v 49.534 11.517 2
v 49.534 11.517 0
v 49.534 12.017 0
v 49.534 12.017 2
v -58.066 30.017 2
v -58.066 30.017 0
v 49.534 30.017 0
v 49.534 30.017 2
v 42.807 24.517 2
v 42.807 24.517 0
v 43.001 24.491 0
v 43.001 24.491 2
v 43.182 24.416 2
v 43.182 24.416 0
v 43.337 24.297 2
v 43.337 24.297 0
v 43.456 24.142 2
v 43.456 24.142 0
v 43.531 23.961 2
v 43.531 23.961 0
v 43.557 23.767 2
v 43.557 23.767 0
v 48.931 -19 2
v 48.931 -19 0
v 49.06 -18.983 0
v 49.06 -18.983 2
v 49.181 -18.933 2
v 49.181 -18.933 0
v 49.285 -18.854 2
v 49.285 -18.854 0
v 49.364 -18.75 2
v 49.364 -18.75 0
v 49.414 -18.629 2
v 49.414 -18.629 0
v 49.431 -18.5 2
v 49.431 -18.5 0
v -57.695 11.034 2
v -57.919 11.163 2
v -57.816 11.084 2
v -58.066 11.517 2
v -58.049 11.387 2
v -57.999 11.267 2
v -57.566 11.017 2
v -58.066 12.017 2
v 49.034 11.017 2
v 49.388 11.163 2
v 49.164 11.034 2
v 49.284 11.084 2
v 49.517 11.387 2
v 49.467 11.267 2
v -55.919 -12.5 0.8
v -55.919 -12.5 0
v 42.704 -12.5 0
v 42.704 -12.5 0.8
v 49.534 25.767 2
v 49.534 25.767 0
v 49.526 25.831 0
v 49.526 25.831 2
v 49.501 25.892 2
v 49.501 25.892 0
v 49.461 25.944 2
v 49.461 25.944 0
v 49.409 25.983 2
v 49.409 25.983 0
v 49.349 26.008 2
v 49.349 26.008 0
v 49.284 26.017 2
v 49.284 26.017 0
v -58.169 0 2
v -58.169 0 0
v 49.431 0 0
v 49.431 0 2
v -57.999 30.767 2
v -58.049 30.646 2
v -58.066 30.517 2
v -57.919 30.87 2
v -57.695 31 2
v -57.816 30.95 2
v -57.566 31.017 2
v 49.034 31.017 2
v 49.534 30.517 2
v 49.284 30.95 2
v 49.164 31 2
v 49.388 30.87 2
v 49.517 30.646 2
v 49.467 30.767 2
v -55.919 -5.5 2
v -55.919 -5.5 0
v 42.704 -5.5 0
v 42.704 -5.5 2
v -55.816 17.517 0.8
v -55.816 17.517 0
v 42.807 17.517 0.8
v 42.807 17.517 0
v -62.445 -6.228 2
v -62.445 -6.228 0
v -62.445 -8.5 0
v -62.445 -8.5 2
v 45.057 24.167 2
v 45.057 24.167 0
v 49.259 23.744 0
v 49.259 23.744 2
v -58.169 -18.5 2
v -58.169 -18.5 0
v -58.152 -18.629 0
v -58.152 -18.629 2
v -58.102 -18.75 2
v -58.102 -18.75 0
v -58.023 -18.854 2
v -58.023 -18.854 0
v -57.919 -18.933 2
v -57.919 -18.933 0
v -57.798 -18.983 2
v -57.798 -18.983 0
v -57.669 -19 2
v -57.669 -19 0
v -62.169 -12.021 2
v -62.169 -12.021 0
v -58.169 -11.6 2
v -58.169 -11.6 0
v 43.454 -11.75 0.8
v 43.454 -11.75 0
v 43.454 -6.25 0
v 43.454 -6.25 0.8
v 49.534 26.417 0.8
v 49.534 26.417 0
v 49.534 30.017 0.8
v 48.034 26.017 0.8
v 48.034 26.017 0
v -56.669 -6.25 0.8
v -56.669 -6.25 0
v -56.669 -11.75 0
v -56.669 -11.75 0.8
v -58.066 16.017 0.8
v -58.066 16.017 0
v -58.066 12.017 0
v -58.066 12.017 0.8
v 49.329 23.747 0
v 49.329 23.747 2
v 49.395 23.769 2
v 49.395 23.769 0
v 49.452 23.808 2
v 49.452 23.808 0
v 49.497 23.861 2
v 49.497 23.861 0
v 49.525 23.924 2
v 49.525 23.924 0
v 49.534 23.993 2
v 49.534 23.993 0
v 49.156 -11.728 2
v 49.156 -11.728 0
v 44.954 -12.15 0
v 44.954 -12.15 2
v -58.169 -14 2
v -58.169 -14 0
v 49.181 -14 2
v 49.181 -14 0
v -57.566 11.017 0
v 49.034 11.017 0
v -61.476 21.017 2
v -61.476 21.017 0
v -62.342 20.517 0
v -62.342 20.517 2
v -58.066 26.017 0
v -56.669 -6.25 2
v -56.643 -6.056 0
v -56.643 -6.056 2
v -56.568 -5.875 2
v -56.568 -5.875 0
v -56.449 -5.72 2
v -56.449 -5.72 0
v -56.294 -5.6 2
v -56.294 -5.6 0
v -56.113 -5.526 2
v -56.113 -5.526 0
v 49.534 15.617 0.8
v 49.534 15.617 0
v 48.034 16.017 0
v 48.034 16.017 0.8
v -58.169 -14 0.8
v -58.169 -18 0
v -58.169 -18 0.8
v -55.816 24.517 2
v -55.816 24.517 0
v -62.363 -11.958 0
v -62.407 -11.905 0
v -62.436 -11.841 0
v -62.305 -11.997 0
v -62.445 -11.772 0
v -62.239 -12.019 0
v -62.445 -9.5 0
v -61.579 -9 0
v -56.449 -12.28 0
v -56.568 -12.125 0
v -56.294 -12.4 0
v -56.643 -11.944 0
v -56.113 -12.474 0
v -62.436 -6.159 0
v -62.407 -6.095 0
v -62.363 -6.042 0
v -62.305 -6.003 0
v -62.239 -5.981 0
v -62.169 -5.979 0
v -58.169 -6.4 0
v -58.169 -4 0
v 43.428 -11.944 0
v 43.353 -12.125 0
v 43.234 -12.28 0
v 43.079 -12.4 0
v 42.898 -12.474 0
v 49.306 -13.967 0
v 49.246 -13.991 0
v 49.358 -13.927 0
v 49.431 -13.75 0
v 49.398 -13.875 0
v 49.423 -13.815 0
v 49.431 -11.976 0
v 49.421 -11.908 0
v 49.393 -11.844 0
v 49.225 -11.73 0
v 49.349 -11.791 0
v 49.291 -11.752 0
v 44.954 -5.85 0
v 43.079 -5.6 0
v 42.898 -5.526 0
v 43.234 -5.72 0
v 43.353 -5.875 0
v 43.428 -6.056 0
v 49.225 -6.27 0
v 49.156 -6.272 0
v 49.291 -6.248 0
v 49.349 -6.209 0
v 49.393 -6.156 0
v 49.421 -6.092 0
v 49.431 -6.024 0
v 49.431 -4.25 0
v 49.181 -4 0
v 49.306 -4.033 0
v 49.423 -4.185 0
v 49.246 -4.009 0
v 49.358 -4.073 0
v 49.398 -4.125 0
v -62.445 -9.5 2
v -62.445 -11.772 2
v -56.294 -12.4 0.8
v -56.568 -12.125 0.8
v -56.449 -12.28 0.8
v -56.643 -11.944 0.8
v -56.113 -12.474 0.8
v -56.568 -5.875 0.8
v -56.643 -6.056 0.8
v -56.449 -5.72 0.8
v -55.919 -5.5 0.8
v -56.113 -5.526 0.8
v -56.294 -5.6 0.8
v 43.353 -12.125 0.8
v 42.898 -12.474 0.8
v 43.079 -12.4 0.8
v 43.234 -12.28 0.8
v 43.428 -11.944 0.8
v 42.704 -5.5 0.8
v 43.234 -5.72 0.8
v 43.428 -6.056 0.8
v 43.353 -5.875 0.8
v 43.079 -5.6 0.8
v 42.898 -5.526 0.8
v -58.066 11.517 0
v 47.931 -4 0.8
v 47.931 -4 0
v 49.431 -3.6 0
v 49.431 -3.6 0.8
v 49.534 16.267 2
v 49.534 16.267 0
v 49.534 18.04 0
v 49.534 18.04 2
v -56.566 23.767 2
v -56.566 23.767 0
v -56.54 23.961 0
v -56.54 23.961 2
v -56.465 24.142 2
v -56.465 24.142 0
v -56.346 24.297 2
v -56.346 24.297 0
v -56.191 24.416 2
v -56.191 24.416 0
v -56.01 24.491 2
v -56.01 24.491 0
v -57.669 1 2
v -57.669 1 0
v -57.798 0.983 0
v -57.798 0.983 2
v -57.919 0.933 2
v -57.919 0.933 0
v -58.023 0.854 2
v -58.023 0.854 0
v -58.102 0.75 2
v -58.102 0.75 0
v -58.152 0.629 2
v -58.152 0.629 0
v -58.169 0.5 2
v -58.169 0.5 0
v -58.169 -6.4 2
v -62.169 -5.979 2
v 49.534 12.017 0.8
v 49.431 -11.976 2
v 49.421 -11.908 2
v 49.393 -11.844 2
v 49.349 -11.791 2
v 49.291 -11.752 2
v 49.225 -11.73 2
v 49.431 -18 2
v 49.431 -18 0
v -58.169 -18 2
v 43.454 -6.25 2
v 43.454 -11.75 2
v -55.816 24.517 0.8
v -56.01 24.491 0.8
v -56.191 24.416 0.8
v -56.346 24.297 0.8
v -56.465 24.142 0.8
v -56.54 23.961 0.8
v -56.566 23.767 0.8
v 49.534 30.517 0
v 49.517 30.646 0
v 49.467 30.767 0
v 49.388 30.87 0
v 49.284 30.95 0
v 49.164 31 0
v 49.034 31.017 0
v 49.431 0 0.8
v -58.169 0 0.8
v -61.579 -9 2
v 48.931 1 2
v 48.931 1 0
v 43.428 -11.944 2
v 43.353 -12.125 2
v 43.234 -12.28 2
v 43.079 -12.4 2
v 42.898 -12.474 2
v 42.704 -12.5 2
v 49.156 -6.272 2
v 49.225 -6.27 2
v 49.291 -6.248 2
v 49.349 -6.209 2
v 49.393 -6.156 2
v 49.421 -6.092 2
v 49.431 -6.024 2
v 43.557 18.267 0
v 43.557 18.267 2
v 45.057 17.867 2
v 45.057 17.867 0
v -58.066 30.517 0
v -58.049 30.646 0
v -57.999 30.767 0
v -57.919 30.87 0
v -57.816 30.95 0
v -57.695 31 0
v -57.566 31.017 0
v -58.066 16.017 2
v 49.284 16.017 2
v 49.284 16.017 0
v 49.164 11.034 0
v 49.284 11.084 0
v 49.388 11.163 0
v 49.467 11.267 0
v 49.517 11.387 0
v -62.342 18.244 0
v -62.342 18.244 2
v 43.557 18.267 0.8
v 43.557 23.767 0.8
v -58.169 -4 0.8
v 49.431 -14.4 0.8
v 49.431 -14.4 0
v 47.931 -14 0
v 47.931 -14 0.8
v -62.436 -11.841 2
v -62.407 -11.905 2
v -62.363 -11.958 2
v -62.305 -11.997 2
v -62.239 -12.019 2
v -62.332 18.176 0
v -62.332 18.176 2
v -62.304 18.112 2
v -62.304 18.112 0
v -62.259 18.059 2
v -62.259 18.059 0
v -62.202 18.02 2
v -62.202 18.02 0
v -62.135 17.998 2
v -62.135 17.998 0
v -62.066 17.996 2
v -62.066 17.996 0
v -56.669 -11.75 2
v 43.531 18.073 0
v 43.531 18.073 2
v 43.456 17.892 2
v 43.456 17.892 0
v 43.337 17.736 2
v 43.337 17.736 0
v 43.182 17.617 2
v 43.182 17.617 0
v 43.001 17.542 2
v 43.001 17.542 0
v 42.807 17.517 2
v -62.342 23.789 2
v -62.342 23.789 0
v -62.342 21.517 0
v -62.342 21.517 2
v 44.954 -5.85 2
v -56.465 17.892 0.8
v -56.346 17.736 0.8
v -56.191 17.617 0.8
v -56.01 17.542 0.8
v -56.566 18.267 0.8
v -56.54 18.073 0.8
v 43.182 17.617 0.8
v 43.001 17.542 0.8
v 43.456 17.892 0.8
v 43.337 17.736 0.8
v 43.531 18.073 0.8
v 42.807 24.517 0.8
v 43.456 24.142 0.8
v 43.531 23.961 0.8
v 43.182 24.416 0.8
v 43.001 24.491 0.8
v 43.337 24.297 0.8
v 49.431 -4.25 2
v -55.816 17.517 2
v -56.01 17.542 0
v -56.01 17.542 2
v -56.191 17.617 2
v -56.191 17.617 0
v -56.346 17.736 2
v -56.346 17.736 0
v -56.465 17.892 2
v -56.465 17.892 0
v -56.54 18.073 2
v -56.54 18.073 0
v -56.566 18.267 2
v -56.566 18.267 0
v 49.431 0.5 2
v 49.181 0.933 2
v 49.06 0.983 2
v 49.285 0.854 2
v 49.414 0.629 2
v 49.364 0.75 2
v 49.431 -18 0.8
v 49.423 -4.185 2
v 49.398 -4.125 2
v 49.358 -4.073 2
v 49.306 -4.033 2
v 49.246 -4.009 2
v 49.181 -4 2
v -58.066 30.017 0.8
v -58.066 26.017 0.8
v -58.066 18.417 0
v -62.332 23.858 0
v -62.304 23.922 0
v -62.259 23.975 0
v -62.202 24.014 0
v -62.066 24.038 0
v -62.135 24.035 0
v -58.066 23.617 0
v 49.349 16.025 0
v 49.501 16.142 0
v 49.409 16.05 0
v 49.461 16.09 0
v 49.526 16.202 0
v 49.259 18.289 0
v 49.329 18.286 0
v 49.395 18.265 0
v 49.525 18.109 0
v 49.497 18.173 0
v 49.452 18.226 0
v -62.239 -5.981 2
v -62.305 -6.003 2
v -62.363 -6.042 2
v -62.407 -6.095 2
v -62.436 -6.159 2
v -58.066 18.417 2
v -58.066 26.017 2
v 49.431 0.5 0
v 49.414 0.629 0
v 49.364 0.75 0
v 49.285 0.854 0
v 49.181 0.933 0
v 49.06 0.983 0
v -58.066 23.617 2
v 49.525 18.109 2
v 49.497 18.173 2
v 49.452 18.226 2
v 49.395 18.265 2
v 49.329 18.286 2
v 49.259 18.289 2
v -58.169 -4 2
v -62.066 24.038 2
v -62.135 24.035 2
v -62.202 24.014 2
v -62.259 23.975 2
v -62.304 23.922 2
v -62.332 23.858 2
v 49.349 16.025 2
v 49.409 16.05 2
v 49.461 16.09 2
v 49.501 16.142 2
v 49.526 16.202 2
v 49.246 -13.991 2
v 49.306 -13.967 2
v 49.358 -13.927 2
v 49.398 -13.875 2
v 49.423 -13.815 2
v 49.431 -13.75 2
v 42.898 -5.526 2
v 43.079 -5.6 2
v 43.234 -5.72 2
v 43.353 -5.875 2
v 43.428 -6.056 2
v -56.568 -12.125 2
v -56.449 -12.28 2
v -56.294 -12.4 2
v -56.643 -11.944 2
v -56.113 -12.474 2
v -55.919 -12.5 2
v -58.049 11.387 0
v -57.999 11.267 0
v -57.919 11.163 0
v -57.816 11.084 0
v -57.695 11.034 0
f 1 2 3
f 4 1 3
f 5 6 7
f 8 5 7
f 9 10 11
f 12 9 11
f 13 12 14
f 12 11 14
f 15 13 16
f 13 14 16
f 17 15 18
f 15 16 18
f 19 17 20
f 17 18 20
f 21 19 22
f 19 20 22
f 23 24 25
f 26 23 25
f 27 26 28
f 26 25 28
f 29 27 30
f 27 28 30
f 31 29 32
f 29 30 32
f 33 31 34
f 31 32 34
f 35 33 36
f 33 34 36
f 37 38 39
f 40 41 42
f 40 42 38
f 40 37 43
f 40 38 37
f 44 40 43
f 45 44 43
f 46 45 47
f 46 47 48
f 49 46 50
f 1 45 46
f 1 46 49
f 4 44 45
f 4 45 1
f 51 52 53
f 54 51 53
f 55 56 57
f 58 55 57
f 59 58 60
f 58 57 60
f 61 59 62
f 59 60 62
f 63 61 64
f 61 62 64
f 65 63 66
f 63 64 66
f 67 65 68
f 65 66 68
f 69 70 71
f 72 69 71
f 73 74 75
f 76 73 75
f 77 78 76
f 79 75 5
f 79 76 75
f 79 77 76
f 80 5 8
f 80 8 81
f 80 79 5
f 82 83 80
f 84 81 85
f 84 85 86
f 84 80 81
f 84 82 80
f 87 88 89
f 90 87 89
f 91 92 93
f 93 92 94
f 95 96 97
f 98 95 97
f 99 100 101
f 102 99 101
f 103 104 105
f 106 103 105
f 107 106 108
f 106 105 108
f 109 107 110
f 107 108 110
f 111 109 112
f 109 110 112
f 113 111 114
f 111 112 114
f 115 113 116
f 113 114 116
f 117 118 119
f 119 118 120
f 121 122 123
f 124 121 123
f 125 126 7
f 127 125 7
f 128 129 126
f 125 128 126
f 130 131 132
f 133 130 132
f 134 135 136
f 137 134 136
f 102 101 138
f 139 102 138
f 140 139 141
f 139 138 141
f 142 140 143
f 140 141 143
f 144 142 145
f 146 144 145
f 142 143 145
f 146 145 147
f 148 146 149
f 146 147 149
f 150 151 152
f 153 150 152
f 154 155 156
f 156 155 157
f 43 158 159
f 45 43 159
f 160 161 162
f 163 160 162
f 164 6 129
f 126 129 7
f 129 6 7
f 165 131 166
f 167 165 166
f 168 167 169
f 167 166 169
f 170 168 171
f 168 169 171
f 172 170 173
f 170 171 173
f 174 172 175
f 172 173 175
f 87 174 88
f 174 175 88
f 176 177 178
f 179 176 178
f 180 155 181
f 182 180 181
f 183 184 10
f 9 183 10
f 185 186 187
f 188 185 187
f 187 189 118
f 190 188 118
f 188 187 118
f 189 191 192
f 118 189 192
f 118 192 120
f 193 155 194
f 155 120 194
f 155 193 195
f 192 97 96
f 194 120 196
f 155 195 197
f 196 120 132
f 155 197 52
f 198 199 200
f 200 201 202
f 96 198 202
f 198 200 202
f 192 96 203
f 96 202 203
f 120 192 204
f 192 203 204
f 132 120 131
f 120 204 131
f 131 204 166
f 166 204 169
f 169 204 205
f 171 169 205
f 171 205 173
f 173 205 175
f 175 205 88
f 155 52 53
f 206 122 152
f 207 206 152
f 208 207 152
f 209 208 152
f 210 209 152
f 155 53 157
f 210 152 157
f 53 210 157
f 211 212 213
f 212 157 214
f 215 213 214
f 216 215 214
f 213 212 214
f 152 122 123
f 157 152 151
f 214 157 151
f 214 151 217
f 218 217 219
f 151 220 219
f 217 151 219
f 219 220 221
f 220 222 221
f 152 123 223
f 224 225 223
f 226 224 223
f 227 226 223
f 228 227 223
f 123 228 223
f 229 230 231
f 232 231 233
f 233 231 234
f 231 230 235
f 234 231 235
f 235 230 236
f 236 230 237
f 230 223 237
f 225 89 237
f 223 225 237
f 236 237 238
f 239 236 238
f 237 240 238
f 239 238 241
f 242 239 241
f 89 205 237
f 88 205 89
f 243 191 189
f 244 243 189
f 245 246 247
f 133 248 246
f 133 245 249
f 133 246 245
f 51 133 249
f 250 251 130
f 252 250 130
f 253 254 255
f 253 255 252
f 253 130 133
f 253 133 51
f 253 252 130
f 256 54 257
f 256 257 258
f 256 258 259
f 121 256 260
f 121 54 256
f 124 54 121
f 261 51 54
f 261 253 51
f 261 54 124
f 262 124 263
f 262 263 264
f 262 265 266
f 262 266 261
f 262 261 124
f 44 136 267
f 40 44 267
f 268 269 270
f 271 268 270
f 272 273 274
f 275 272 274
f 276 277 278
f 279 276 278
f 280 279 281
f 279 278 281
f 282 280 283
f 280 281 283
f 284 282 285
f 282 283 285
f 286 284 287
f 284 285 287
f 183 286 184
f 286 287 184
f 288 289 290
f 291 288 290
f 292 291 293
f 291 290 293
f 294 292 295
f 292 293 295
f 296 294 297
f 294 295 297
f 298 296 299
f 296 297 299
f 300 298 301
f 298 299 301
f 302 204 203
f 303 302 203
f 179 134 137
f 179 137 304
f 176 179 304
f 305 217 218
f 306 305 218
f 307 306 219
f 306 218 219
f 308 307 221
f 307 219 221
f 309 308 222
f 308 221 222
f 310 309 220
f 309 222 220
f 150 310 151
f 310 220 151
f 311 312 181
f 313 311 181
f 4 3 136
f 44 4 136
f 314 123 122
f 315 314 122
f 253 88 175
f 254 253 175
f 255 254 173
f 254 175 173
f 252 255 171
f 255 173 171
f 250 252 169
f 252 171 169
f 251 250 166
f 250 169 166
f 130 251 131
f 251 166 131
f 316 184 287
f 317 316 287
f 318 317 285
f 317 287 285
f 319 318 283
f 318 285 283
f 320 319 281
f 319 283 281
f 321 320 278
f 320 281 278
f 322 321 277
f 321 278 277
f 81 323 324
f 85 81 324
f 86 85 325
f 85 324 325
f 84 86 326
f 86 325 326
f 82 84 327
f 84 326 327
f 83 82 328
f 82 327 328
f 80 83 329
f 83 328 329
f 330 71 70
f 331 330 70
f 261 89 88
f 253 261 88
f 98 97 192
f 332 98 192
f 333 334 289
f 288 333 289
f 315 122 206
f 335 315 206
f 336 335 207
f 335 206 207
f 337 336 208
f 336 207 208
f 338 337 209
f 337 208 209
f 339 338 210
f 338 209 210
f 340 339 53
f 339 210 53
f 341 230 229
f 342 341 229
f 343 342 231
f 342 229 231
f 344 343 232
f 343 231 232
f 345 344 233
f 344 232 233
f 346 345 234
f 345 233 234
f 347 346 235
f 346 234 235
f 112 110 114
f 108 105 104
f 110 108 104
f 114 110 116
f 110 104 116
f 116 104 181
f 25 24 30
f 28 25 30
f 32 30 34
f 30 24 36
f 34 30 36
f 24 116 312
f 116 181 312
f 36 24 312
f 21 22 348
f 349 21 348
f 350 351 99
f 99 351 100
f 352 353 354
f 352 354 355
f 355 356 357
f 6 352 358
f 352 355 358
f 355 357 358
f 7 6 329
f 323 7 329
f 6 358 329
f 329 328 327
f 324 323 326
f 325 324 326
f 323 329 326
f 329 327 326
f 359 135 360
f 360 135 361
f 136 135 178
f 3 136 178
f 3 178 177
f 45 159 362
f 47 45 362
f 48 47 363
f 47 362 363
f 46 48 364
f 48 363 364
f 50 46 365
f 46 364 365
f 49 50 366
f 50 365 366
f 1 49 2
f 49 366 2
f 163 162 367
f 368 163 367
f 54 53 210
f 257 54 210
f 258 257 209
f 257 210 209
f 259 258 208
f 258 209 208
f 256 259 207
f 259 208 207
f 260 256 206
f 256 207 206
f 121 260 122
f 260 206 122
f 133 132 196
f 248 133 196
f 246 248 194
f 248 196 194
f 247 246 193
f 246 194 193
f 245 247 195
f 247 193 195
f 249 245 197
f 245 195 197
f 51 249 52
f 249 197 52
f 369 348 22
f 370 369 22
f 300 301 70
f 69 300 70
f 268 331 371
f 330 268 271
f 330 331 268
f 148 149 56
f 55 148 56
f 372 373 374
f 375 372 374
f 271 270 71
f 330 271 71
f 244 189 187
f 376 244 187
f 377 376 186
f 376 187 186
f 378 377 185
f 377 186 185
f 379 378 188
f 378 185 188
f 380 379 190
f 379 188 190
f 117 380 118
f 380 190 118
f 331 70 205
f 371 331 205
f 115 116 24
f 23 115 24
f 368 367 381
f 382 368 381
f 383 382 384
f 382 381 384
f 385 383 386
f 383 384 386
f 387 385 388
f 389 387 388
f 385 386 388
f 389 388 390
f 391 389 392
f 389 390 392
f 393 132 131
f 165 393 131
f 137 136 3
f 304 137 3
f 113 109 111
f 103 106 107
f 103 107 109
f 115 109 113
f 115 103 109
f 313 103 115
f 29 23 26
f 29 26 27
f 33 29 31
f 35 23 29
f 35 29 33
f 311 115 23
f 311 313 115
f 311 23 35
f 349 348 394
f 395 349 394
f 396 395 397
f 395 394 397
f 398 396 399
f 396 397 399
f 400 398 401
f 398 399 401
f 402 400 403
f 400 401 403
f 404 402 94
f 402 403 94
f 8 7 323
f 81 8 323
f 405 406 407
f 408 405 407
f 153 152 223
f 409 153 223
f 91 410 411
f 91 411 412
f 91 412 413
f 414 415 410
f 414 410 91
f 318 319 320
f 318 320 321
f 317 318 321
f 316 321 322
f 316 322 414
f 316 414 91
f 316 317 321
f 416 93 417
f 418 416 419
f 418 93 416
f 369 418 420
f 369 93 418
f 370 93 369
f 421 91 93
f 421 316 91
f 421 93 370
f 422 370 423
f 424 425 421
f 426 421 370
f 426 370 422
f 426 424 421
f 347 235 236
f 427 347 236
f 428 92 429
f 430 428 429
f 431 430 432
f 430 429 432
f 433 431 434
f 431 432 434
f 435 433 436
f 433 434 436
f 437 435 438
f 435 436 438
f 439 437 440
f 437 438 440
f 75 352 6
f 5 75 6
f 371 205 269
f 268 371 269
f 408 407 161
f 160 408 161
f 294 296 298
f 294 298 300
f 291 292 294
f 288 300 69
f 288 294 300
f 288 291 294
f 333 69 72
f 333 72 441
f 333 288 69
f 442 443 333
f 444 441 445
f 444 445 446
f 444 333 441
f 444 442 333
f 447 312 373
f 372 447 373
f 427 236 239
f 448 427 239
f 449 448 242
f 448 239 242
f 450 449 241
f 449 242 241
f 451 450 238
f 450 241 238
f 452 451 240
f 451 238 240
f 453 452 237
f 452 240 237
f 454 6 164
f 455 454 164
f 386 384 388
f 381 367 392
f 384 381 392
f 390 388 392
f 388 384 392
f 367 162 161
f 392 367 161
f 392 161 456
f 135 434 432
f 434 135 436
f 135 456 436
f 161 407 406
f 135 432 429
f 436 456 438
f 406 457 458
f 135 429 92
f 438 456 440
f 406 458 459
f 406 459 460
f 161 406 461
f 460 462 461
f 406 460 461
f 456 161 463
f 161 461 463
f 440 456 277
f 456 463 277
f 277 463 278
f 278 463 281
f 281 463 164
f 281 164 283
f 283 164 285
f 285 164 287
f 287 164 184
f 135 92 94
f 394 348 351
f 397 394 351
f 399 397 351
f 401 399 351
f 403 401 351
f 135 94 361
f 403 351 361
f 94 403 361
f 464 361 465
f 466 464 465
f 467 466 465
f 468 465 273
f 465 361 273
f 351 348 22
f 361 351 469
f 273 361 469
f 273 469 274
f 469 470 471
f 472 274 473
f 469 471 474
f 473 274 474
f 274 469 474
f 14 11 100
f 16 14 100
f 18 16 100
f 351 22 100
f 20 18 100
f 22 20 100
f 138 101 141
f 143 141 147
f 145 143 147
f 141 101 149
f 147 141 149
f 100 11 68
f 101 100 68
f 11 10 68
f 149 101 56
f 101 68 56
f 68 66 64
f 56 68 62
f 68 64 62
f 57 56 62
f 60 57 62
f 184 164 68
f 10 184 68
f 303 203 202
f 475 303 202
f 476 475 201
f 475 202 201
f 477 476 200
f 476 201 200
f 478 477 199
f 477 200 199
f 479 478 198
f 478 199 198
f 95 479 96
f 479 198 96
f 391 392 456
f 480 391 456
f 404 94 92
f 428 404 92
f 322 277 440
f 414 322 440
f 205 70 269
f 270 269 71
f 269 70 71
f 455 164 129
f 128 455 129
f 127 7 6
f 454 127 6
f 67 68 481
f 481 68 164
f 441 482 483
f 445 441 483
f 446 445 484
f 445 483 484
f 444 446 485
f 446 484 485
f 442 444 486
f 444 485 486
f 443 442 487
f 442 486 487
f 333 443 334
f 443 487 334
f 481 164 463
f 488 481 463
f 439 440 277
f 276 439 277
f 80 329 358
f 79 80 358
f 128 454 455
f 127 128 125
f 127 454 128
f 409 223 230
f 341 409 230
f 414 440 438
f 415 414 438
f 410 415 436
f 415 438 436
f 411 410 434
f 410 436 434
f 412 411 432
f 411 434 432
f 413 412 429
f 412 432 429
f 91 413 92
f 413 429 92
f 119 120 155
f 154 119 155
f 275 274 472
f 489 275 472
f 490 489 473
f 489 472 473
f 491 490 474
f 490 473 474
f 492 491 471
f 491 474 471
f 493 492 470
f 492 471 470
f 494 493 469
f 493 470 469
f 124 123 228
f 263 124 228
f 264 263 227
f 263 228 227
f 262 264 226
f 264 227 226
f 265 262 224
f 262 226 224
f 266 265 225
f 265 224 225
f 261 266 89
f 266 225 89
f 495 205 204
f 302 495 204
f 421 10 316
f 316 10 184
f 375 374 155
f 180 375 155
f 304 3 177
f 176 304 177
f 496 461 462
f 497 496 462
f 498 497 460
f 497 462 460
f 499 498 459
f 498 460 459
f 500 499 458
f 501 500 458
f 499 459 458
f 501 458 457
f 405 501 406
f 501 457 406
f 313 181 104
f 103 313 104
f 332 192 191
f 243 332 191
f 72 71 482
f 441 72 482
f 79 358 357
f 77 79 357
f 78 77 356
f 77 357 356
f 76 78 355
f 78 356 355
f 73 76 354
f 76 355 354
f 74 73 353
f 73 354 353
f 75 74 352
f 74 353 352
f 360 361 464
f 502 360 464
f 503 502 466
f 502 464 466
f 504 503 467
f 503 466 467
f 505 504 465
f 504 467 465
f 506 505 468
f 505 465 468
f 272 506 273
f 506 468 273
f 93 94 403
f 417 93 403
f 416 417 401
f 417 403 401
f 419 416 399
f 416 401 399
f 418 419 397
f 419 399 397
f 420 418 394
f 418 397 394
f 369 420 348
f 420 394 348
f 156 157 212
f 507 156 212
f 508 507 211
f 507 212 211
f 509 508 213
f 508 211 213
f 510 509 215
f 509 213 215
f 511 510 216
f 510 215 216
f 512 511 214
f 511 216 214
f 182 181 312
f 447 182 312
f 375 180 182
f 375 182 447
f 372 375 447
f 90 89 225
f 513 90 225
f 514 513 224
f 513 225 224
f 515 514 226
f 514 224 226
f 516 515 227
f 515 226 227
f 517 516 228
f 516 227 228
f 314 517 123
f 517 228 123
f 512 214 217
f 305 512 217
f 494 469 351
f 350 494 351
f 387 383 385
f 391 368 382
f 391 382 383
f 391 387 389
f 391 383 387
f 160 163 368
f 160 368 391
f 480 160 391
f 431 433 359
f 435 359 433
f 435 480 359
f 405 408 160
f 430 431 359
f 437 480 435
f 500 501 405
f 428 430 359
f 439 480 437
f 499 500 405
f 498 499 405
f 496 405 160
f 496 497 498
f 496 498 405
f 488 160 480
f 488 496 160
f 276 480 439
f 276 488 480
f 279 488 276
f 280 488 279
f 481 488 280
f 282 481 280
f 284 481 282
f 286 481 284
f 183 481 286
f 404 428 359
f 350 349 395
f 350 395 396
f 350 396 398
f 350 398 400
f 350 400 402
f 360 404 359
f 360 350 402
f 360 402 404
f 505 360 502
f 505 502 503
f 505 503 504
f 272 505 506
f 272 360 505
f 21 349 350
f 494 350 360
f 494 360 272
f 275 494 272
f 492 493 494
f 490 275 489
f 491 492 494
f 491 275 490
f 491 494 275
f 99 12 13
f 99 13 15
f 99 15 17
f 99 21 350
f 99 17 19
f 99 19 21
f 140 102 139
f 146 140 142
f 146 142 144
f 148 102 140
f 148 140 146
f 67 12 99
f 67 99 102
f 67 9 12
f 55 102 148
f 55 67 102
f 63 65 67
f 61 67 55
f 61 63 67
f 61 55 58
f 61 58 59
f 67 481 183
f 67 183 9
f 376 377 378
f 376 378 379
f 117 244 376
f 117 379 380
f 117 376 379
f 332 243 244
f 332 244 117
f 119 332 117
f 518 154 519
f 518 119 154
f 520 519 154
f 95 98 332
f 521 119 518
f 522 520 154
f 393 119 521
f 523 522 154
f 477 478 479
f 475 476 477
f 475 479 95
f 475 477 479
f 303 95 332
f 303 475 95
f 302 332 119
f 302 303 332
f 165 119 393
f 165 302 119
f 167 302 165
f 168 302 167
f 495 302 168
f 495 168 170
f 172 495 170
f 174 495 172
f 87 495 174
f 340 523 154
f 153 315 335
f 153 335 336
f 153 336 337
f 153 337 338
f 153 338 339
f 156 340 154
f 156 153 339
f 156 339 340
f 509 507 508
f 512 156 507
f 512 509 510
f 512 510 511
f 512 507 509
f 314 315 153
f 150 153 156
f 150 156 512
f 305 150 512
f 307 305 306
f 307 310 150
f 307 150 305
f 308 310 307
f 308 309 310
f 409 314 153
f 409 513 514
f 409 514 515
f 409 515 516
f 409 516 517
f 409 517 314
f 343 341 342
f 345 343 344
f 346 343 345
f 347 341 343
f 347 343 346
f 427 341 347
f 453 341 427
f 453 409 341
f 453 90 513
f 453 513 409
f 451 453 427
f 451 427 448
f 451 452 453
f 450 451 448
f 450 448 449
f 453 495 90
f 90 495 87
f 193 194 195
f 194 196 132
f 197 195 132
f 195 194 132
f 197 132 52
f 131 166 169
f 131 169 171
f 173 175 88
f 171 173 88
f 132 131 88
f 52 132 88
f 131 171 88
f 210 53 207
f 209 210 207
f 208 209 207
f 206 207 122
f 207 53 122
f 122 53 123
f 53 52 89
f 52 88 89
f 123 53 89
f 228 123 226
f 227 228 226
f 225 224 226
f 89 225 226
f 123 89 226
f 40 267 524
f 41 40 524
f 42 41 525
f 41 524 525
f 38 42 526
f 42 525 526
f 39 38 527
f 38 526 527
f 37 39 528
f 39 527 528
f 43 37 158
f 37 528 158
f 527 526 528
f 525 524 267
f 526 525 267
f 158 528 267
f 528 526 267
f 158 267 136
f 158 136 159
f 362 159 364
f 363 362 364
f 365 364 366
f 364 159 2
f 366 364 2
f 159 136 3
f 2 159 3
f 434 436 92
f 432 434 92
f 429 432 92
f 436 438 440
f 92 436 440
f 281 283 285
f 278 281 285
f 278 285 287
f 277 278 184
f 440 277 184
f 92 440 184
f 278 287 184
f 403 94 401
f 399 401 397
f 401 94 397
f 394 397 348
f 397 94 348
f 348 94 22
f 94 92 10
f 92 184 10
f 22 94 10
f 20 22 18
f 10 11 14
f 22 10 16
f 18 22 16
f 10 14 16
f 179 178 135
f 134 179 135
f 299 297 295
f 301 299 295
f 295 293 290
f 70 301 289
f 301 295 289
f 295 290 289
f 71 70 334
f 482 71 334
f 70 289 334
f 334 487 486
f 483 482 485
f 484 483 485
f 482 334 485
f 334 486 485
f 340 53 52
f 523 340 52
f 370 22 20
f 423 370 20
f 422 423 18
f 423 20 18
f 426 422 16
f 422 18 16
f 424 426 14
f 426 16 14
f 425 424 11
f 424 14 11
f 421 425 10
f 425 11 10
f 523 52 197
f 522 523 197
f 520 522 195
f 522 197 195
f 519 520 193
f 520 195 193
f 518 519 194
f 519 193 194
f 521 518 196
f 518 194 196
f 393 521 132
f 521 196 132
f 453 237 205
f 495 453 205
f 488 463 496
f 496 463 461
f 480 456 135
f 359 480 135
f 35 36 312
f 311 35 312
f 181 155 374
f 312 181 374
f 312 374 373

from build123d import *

# Parameters (mm, degrees)
F1_DEPTH = 2
F2_DEPTH = 0.8


with BuildPart() as f1:
    # F0 (on Top) → F1 (new body)
    with BuildSketch(Plane.XY):
        with BuildLine():
            Line((48.9310387218, 1), (-57.6689612782, 1))
            ThreePointArc((-57.6689612782, 1), (-58.0225146688, 0.8535533906), (-58.1689612782, 0.5))
            Line((-58.1689612782, 0.5), (-58.1689612782, 0))
            Line((-58.1689612782, 0), (49.4310387218, 0))
            Line((49.4310387218, 0), (49.4310387218, 0.5))
            ThreePointArc((49.4310387218, 0.5), (49.2845921124, 0.8535533906), (48.9310387218, 1))
        make_face()
    extrude(amount=F1_DEPTH)


with BuildPart() as f1b:
    # F0 (on Top) → F1, piece 2 (new body)
    with BuildSketch(Plane.XY):
        with BuildLine():
            Line((47.9310387218, -4), (-58.1689612782, -4))
            Line((-58.1689612782, -4), (-58.1689612782, -6.4))
            Line((-58.1689612782, -6.4), (-62.1691871508, -5.9790603277))
            ThreePointArc((-62.1691871508, -5.9790603277), (-62.362621132, -6.0418910502), (-62.4453499415, -6.2276875755))
            Line((-62.4453499415, -6.2276875755), (-62.4453499415, -8.5))
            Line((-62.4453499415, -8.5), (-61.5793245377, -9))
            Line((-61.5793245377, -9), (-62.4453499415, -9.5))
            Line((-62.4453499415, -9.5), (-62.4453499415, -11.7723124245))
            ThreePointArc((-62.4453499415, -11.7723124245), (-62.362621132, -11.9581089498), (-62.1691871508, -12.0209396723))
            Line((-62.1691871508, -12.0209396723), (-58.1689612782, -11.6))
            Line((-58.1689612782, -11.6), (-58.1689612782, -14))
            Line((-58.1689612782, -14), (47.9310387218, -14))
            Line((47.9310387218, -14), (49.1810387199, -14))
            ThreePointArc((49.1810387199, -14), (49.3578154159, -13.9267766946), (49.4310387199, -13.7499999981))
            Line((49.4310387199, -13.7499999981), (49.4310387064, -11.9763853971))
            ThreePointArc((49.4310387064, -11.9763853971), (49.348743804, -11.7909804362), (49.1560387064, -11.7276385397))
            Line((49.1560387064, -11.7276385397), (44.9535952373, -12.15))
            Line((44.9535952373, -12.15), (44.9535952225, -5.85))
            Line((44.9535952225, -5.85), (49.1560386934, -6.2723614605))
            ThreePointArc((49.1560386934, -6.2723614605), (49.3487437904, -6.2090195646), (49.4310386934, -6.0236146047))
            Line((49.4310386934, -6.0236146047), (49.4310387183, -4.2500000035))
            ThreePointArc((49.4310387183, -4.2500000035), (49.3578154149, -4.0732233059), (49.1810387183, -4))
            Line((49.1810387183, -4), (47.9310387218, -4))
        make_face()
        with BuildLine():
            ThreePointArc((-56.6689612782, -6.25), (-56.4492913641, -5.7196699141), (-55.9189612782, -5.5))
            Line((-55.9189612782, -5.5), (42.7035952381, -5.5))
            ThreePointArc((42.7035952381, -5.5), (43.233925324, -5.7196699141), (43.4535952381, -6.25))
            Line((43.4535952381, -6.25), (43.4535952381, -11.75))
            ThreePointArc((43.4535952381, -11.75), (43.233925324, -12.2803300859), (42.7035952381, -12.5))
            Line((42.7035952381, -12.5), (-55.9189612782, -12.5))
            ThreePointArc((-55.9189612782, -12.5), (-56.4492913641, -12.2803300859), (-56.6689612782, -11.75))
            Line((-56.6689612782, -11.75), (-56.6689612782, -6.25))
        make_face(mode=Mode.SUBTRACT)
    extrude(amount=F1_DEPTH)


with BuildPart() as f1c:
    # F0 (on Top) → F1, piece 3 (new body)
    with BuildSketch(Plane.XY):
        with BuildLine():
            Line((49.4310387218, -18), (-58.1689612782, -18))
            Line((-58.1689612782, -18), (-58.1689612782, -18.5))
            ThreePointArc((-58.1689612782, -18.5), (-58.0225146688, -18.8535533906), (-57.6689612782, -19))
            Line((-57.6689612782, -19), (48.9310387218, -19))
            ThreePointArc((48.9310387218, -19), (49.2845921124, -18.8535533906), (49.4310387218, -18.5))
            Line((49.4310387218, -18.5), (49.4310387218, -18))
        make_face()
    extrude(amount=F1_DEPTH)


with BuildPart() as f1d:
    # F0 (on Top) → F1, piece 4 (new body)
    with BuildSketch(Plane.XY):
        with BuildLine():
            Line((49.034391772, 31.0167935491), (-57.565608228, 31.0167935491))
            ThreePointArc((-57.565608228, 31.0167935491), (-57.9191616185, 30.8703469397), (-58.065608228, 30.5167935491))
            Line((-58.065608228, 30.5167935491), (-58.065608228, 30.0167935491))
            Line((-58.065608228, 30.0167935491), (49.534391772, 30.0167935491))
            Line((49.534391772, 30.0167935491), (49.534391772, 30.5167935491))
            ThreePointArc((49.534391772, 30.5167935491), (49.3879451626, 30.8703469397), (49.034391772, 31.0167935491))
        make_face()
    extrude(amount=F1_DEPTH)


with BuildPart() as f1e:
    # F0 (on Top) → F1, piece 5 (new body)
    with BuildSketch(Plane.XY):
        with BuildLine():
            Line((48.034391772, 26.0167935491), (-58.065608228, 26.0167935491))
            Line((-58.065608228, 26.0167935491), (-58.065608228, 23.6167935491))
            Line((-58.065608228, 23.6167935491), (-62.0658341006, 24.0377332214))
            ThreePointArc((-62.0658341006, 24.0377332214), (-62.2592680818, 23.9749024989), (-62.3419968913, 23.7891059735))
            Line((-62.3419968913, 23.7891059735), (-62.3419968913, 21.5167935491))
            Line((-62.3419968913, 21.5167935491), (-61.4759714875, 21.0167935491))
            Line((-61.4759714875, 21.0167935491), (-62.3419968913, 20.5167935491))
            Line((-62.3419968913, 20.5167935491), (-62.3419968913, 18.2444811246))
            ThreePointArc((-62.3419968913, 18.2444811246), (-62.2592680818, 18.0586845992), (-62.0658341006, 17.9958538767))
            Line((-62.0658341006, 17.9958538767), (-58.065608228, 18.4167935491))
            Line((-58.065608228, 18.4167935491), (-58.065608228, 16.0167935491))
            Line((-58.065608228, 16.0167935491), (48.034391772, 16.0167935491))
            Line((48.034391772, 16.0167935491), (49.2843917886, 16.0167935491))
            ThreePointArc((49.2843917886, 16.0167935491), (49.4611684781, 16.0900168479), (49.5343917886, 16.2667935325))
            Line((49.5343917886, 16.2667935325), (49.5343919064, 18.0404081314))
            ThreePointArc((49.5343919064, 18.0404081314), (49.4520970108, 18.2258131046), (49.2593919064, 18.2891550073))
            Line((49.2593919064, 18.2891550073), (45.0569484577, 17.8667935491))
            Line((45.0569484577, 17.8667935491), (45.0569483455, 24.1667935491))
            Line((45.0569483455, 24.1667935491), (49.2593918076, 23.7444320895))
            ThreePointArc((49.2593918076, 23.7444320895), (49.4520969076, 23.807773988), (49.5343918076, 23.9931789531))
            Line((49.5343918076, 23.9931789531), (49.5343917764, 25.7667935535))
            ThreePointArc((49.5343917764, 25.7667935535), (49.4611684702, 25.9435702459), (49.2843917764, 26.0167935491))
            Line((49.2843917764, 26.0167935491), (48.034391772, 26.0167935491))
        make_face()
        with BuildLine():
            ThreePointArc((-56.565608228, 23.7667935491), (-56.3459383138, 24.297123635), (-55.815608228, 24.5167935491))
            Line((-55.815608228, 24.5167935491), (42.8069484639, 24.5167935491))
            ThreePointArc((42.8069484639, 24.5167935491), (43.3372785498, 24.297123635), (43.5569484639, 23.7667935491))
            Line((43.5569484639, 23.7667935491), (43.5569484639, 18.2667935491))
            ThreePointArc((43.5569484639, 18.2667935491), (43.3372785498, 17.7364634632), (42.8069484639, 17.5167935491))
            Line((42.8069484639, 17.5167935491), (-55.815608228, 17.5167935491))
            ThreePointArc((-55.815608228, 17.5167935491), (-56.3459383138, 17.7364634632), (-56.565608228, 18.2667935491))
            Line((-56.565608228, 18.2667935491), (-56.565608228, 23.7667935491))
        make_face(mode=Mode.SUBTRACT)
    extrude(amount=F1_DEPTH)


with BuildPart() as f1f:
    # F0 (on Top) → F1, piece 6 (new body)
    with BuildSketch(Plane.XY):
        with BuildLine():
            Line((49.534391772, 12.0167935491), (-58.065608228, 12.0167935491))
            Line((-58.065608228, 12.0167935491), (-58.065608228, 11.5167935491))
            ThreePointArc((-58.065608228, 11.5167935491), (-57.9191616185, 11.1632401585), (-57.565608228, 11.0167935491))
            Line((-57.565608228, 11.0167935491), (49.034391772, 11.0167935491))
            ThreePointArc((49.034391772, 11.0167935491), (49.3879451626, 11.1632401585), (49.534391772, 11.5167935491))
            Line((49.534391772, 11.5167935491), (49.534391772, 12.0167935491))
        make_face()
    extrude(amount=F1_DEPTH)


with BuildPart() as f2:
    # F0 (on Top) → F2 (new body)
    with BuildSketch(Plane.XY):
        Polygon((49.4310387218, 0), (-58.1689612782, 0), (-58.1689612782, -4), (47.9310387218, -4), (49.4310387218, -3.6), align=None)
    extrude(amount=F2_DEPTH)


with BuildPart() as f2b:
    # F0 (on Top) → F2, piece 2 (new body)
    with BuildSketch(Plane.XY):
        with BuildLine():
            Line((42.7035952381, -5.5), (-55.9189612782, -5.5))
            ThreePointArc((-55.9189612782, -5.5), (-56.4492913641, -5.7196699141), (-56.6689612782, -6.25))
            Line((-56.6689612782, -6.25), (-56.6689612782, -11.75))
            ThreePointArc((-56.6689612782, -11.75), (-56.4492913641, -12.2803300859), (-55.9189612782, -12.5))
            Line((-55.9189612782, -12.5), (42.7035952381, -12.5))
            ThreePointArc((42.7035952381, -12.5), (43.233925324, -12.2803300859), (43.4535952381, -11.75))
            Line((43.4535952381, -11.75), (43.4535952381, -6.25))
            ThreePointArc((43.4535952381, -6.25), (43.233925324, -5.7196699141), (42.7035952381, -5.5))
        make_face()
    extrude(amount=F2_DEPTH)


with BuildPart() as f2c:
    # F0 (on Top) → F2, piece 3 (new body)
    with BuildSketch(Plane.XY):
        Polygon((47.9310387218, -14), (-58.1689612782, -14), (-58.1689612782, -18), (49.4310387218, -18), (49.4310387218, -14.4), align=None)
    extrude(amount=F2_DEPTH)


with BuildPart() as f2d:
    # F0 (on Top) → F2, piece 4 (new body)
    with BuildSketch(Plane.XY):
        Polygon((49.534391772, 30.0167935491), (-58.065608228, 30.0167935491), (-58.065608228, 26.0167935491), (48.034391772, 26.0167935491), (49.534391772, 26.4167935491), align=None)
    extrude(amount=F2_DEPTH)


with BuildPart() as f2e:
    # F0 (on Top) → F2, piece 5 (new body)
    with BuildSketch(Plane.XY):
        with BuildLine():
            Line((42.8069484639, 24.5167935491), (-55.815608228, 24.5167935491))
            ThreePointArc((-55.815608228, 24.5167935491), (-56.3459383138, 24.297123635), (-56.565608228, 23.7667935491))
            Line((-56.565608228, 23.7667935491), (-56.565608228, 18.2667935491))
            ThreePointArc((-56.565608228, 18.2667935491), (-56.3459383138, 17.7364634632), (-55.815608228, 17.5167935491))
            Line((-55.815608228, 17.5167935491), (42.8069484639, 17.5167935491))
            ThreePointArc((42.8069484639, 17.5167935491), (43.3372785498, 17.7364634632), (43.5569484639, 18.2667935491))
            Line((43.5569484639, 18.2667935491), (43.5569484639, 23.7667935491))
            ThreePointArc((43.5569484639, 23.7667935491), (43.3372785498, 24.297123635), (42.8069484639, 24.5167935491))
        make_face()
    extrude(amount=F2_DEPTH)


with BuildPart() as f2f:
    # F0 (on Top) → F2, piece 6 (new body)
    with BuildSketch(Plane.XY):
        Polygon((48.034391772, 16.0167935491), (-58.065608228, 16.0167935491), (-58.065608228, 12.0167935491), (49.534391772, 12.0167935491), (49.534391772, 15.6167935491), align=None)
    extrude(amount=F2_DEPTH)


solid = Compound([f1.part, f1b.part, f1c.part, f1d.part, f1e.part, f1f.part, f2.part, f2b.part, f2c.part, f2d.part, f2e.part, f2f.part])
